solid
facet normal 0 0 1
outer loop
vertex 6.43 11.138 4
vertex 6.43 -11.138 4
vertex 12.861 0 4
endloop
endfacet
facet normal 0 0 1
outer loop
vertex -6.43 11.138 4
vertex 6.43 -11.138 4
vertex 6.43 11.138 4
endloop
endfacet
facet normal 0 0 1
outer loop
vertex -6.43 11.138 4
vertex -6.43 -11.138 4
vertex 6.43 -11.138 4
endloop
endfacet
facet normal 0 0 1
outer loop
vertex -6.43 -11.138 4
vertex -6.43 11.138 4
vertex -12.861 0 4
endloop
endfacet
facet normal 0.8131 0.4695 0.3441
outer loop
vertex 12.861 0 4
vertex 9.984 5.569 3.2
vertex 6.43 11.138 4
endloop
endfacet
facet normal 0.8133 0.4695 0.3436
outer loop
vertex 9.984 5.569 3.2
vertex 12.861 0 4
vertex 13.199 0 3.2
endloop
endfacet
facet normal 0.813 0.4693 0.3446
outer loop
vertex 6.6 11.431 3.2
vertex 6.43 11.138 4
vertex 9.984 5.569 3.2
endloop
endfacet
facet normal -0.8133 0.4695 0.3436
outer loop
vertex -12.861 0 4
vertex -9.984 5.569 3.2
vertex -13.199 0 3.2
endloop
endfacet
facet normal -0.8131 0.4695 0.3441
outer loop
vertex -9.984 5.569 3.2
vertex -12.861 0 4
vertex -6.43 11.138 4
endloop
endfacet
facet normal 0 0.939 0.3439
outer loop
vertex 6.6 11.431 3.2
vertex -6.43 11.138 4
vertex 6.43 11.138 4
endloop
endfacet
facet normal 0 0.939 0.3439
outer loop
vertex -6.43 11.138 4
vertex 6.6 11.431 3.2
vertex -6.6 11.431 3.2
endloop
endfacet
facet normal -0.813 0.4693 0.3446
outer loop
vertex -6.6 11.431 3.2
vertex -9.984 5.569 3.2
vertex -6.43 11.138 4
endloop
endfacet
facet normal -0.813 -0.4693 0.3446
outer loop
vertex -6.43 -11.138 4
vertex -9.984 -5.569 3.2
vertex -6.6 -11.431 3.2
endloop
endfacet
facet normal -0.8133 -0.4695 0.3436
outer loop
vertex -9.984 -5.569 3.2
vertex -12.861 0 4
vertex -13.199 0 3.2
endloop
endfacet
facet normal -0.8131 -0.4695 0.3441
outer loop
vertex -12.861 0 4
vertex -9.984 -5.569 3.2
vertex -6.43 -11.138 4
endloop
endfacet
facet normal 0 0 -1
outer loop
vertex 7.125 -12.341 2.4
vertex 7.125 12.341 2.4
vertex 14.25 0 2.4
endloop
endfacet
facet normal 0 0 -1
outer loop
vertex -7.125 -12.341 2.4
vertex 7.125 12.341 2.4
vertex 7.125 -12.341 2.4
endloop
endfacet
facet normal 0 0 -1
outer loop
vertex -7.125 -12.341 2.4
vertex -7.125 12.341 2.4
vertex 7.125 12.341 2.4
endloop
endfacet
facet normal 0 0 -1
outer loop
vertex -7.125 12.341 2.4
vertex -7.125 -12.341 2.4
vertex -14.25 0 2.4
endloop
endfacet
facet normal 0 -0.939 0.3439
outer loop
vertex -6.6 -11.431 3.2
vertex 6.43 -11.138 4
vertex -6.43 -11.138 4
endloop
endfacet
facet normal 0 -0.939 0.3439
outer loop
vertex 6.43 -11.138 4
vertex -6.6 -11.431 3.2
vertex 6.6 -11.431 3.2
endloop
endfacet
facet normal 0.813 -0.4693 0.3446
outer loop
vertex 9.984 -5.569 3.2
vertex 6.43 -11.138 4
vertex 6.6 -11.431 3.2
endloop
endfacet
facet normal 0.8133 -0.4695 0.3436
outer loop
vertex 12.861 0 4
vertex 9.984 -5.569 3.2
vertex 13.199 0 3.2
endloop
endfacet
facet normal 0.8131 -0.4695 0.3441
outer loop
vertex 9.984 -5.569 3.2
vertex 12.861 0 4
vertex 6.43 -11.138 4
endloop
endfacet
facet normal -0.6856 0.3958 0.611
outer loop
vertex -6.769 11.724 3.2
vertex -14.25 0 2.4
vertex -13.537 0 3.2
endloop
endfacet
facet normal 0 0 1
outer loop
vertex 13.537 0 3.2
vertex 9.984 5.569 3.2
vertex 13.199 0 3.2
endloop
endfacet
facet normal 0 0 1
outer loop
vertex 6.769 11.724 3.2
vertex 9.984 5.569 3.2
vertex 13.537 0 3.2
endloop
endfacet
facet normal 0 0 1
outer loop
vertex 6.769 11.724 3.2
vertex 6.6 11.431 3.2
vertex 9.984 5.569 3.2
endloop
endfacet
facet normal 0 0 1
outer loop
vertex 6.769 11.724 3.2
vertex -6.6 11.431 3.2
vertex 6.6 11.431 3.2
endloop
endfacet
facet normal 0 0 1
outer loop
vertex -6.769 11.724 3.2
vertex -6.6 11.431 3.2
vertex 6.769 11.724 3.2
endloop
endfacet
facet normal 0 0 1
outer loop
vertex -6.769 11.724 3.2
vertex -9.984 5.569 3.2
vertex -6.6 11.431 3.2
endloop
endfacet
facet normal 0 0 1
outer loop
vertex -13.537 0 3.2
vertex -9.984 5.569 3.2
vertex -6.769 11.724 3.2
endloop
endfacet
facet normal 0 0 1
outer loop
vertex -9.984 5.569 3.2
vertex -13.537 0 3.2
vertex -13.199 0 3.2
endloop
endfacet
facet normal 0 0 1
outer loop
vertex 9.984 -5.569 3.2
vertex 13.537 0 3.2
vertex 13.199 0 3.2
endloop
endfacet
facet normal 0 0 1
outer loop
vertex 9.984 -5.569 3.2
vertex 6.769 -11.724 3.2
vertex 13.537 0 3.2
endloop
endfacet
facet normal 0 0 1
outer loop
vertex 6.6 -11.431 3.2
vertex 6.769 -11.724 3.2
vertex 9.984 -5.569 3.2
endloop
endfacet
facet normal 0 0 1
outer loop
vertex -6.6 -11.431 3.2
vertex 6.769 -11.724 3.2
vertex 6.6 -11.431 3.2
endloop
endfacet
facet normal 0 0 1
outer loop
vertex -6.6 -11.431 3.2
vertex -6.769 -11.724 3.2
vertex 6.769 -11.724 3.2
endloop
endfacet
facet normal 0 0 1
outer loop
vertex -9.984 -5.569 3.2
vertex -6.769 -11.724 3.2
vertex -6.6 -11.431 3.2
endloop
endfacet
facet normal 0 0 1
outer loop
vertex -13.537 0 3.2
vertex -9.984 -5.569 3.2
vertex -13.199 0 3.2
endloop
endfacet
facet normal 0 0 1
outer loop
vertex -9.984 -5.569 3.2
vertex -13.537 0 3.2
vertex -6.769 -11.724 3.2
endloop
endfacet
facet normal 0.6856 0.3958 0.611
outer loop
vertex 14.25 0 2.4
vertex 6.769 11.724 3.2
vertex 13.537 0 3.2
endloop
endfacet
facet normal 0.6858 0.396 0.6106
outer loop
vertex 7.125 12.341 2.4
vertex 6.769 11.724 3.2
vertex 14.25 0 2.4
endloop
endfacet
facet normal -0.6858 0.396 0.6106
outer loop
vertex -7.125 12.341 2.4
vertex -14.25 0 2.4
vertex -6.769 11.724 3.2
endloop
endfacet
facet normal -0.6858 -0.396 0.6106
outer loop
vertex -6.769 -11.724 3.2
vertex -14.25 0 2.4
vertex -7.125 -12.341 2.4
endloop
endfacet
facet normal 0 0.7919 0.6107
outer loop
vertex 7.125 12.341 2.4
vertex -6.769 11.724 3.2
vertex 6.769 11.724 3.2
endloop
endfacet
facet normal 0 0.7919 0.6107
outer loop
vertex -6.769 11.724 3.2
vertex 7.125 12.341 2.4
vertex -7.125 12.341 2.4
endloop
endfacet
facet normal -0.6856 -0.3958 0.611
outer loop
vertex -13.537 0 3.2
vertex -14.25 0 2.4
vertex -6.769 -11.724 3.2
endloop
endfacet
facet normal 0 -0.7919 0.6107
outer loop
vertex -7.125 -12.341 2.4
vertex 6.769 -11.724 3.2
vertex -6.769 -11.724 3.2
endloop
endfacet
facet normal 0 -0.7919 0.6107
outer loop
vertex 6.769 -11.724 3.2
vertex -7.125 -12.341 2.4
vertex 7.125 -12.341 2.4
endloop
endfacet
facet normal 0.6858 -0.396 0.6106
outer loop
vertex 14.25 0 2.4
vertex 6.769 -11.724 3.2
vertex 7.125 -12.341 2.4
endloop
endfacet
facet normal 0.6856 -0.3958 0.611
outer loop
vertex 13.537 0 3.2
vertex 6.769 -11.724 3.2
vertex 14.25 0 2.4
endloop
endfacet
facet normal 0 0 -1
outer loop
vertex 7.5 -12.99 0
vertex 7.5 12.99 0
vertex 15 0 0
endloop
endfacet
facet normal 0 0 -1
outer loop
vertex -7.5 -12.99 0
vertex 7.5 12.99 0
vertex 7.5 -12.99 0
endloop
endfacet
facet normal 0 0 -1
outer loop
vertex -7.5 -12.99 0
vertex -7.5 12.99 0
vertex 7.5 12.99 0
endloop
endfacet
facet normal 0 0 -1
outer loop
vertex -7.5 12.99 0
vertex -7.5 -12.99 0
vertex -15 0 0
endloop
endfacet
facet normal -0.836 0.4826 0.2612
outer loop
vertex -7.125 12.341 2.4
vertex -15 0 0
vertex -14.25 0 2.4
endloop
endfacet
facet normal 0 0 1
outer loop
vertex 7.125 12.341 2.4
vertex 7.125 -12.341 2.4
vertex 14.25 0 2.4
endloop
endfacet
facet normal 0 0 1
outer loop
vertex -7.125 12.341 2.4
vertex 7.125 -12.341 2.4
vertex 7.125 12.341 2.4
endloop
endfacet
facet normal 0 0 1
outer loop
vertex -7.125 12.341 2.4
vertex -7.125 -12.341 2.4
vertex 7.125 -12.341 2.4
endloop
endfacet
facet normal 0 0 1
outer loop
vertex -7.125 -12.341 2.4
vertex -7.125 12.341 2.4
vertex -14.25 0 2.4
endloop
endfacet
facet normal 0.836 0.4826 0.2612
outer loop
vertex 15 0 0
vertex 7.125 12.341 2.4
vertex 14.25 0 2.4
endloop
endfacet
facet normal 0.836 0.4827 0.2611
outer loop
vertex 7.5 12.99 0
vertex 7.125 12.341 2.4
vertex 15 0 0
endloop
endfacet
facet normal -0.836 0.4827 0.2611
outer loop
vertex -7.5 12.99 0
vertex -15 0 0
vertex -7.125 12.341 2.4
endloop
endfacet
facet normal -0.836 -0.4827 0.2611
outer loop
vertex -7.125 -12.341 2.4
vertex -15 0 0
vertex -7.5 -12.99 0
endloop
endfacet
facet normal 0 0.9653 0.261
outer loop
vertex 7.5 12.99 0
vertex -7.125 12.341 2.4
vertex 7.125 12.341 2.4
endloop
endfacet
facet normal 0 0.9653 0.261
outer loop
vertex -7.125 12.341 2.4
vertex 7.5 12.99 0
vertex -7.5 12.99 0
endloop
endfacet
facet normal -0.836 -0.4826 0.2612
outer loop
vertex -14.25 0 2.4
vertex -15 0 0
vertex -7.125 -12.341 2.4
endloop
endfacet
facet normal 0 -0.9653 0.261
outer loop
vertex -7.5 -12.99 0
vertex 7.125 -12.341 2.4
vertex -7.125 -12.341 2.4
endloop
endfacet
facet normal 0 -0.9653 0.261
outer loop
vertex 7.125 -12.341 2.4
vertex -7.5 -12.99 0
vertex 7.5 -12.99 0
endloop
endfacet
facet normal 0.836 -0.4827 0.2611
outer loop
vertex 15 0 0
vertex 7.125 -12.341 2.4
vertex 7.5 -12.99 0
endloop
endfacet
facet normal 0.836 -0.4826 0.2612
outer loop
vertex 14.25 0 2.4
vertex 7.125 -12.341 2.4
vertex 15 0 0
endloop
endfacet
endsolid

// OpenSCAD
// file: build.scad
$build_id = "";

function building(filename) = is_undef(filename) ?
  !is_undef(build)
  : !is_undef(build) && build == filename;

function previewing() = !building();

module build(filename) {
  $build_id = filename;

  if(!is_undef(scad_build_scan) && scad_build_scan == true) {
    echo(str("scad_build_scan: ", filename));
  }
  else if(previewing() || build == filename) {
    children();
  }
}

module preview_row(spacing) {
  if(previewing()) {
    for(x = [0:1:$children - 1]) {
      translate([x * spacing, 0, 0]) {
        children(x);
      }
    }
  }
  else {
    children();
  }
}

module preview_column(spacing) {
  if(previewing()) {
    for(y = [0:1:$children - 1]) {
      translate([0, y * spacing, 0]) {
        children(y);
      }
    }
  }
  else {
    children();
  }
}
// file: minibase.scad
// Based off of titancraft's Customizable Miniature Base (CC0 1.0)
// https://www.thingiverse.com/thing:1112237

include <./build.scad>

$base_rim = 1; //	[1: tapered, 2: inclined, 3: flat]
// Number of sides:
$base_shape = 100; //	[30:Low-res Circle, 100: Hi-res Circle, 5:Pentagon, 6:Hexagon, 8:Octagon, 4:Square, 3:Triangle]

$base_diameter = 32;
$base_height = 4;
$base_slant = 95; // [50:100]

// Percentage:
$base_stretch = 100;

//('Cool' base only)
$base_inner_circle_ratio = 40; // [10:80]

module tapered(r=40) {
  $base_rim = 1;
  $base_inner_circle_ratio = r;

  children();
}

module inclined() {
  $base_rim = 2;

  children();
}

module flat() {
  $base_rim = 3;

  children();
}

module shape(s) {
  $base_shape = s;

  children();
}

module diameter(d) {
  $base_diameter = d;

  children();
}

module height(h) {
  $base_height = h;

  children();
}

module slant(s) {
  $base_slant = s;

  children();
}

module stretch(s) {
  $base_stretch = s;

  children();
}

module base(id) {
  build(id) union() {
    radius = $base_diameter/2;
    scale([$base_stretch/100, 1, 1]){
      if ($base_rim == 1){
        // tapered base
        cyl1_height = $base_height * (1-$base_inner_circle_ratio/100);
        cylinder(cyl1_height, radius, radius * $base_slant/100, $fn=$base_shape);

        cyl2_radius = radius  * $base_slant/100 * .95;
        cyl2_height = $base_height - cyl1_height;

        translate([0, 0, cyl1_height]){
          cylinder(cyl2_height, cyl2_radius, cyl2_radius * $base_slant/100, $fn=$base_shape);
          cylinder(cyl2_height*.5, radius * $base_slant/100, cyl2_radius, $fn=$base_shape);
        }
      } else if ($base_rim == 2){
        // inclined base
        cylinder($base_height, radius, radius * $base_slant/100, $fn=$base_shape);
      } else if ($base_rim == 3){
        // flat base

        cylinder($base_height, radius, radius, $fn=$base_shape);
      }
    }
  }
}
// main file
include <./minibase.scad>

tapered() diameter(30) shape(6) base("30mm-battletech-hex");
